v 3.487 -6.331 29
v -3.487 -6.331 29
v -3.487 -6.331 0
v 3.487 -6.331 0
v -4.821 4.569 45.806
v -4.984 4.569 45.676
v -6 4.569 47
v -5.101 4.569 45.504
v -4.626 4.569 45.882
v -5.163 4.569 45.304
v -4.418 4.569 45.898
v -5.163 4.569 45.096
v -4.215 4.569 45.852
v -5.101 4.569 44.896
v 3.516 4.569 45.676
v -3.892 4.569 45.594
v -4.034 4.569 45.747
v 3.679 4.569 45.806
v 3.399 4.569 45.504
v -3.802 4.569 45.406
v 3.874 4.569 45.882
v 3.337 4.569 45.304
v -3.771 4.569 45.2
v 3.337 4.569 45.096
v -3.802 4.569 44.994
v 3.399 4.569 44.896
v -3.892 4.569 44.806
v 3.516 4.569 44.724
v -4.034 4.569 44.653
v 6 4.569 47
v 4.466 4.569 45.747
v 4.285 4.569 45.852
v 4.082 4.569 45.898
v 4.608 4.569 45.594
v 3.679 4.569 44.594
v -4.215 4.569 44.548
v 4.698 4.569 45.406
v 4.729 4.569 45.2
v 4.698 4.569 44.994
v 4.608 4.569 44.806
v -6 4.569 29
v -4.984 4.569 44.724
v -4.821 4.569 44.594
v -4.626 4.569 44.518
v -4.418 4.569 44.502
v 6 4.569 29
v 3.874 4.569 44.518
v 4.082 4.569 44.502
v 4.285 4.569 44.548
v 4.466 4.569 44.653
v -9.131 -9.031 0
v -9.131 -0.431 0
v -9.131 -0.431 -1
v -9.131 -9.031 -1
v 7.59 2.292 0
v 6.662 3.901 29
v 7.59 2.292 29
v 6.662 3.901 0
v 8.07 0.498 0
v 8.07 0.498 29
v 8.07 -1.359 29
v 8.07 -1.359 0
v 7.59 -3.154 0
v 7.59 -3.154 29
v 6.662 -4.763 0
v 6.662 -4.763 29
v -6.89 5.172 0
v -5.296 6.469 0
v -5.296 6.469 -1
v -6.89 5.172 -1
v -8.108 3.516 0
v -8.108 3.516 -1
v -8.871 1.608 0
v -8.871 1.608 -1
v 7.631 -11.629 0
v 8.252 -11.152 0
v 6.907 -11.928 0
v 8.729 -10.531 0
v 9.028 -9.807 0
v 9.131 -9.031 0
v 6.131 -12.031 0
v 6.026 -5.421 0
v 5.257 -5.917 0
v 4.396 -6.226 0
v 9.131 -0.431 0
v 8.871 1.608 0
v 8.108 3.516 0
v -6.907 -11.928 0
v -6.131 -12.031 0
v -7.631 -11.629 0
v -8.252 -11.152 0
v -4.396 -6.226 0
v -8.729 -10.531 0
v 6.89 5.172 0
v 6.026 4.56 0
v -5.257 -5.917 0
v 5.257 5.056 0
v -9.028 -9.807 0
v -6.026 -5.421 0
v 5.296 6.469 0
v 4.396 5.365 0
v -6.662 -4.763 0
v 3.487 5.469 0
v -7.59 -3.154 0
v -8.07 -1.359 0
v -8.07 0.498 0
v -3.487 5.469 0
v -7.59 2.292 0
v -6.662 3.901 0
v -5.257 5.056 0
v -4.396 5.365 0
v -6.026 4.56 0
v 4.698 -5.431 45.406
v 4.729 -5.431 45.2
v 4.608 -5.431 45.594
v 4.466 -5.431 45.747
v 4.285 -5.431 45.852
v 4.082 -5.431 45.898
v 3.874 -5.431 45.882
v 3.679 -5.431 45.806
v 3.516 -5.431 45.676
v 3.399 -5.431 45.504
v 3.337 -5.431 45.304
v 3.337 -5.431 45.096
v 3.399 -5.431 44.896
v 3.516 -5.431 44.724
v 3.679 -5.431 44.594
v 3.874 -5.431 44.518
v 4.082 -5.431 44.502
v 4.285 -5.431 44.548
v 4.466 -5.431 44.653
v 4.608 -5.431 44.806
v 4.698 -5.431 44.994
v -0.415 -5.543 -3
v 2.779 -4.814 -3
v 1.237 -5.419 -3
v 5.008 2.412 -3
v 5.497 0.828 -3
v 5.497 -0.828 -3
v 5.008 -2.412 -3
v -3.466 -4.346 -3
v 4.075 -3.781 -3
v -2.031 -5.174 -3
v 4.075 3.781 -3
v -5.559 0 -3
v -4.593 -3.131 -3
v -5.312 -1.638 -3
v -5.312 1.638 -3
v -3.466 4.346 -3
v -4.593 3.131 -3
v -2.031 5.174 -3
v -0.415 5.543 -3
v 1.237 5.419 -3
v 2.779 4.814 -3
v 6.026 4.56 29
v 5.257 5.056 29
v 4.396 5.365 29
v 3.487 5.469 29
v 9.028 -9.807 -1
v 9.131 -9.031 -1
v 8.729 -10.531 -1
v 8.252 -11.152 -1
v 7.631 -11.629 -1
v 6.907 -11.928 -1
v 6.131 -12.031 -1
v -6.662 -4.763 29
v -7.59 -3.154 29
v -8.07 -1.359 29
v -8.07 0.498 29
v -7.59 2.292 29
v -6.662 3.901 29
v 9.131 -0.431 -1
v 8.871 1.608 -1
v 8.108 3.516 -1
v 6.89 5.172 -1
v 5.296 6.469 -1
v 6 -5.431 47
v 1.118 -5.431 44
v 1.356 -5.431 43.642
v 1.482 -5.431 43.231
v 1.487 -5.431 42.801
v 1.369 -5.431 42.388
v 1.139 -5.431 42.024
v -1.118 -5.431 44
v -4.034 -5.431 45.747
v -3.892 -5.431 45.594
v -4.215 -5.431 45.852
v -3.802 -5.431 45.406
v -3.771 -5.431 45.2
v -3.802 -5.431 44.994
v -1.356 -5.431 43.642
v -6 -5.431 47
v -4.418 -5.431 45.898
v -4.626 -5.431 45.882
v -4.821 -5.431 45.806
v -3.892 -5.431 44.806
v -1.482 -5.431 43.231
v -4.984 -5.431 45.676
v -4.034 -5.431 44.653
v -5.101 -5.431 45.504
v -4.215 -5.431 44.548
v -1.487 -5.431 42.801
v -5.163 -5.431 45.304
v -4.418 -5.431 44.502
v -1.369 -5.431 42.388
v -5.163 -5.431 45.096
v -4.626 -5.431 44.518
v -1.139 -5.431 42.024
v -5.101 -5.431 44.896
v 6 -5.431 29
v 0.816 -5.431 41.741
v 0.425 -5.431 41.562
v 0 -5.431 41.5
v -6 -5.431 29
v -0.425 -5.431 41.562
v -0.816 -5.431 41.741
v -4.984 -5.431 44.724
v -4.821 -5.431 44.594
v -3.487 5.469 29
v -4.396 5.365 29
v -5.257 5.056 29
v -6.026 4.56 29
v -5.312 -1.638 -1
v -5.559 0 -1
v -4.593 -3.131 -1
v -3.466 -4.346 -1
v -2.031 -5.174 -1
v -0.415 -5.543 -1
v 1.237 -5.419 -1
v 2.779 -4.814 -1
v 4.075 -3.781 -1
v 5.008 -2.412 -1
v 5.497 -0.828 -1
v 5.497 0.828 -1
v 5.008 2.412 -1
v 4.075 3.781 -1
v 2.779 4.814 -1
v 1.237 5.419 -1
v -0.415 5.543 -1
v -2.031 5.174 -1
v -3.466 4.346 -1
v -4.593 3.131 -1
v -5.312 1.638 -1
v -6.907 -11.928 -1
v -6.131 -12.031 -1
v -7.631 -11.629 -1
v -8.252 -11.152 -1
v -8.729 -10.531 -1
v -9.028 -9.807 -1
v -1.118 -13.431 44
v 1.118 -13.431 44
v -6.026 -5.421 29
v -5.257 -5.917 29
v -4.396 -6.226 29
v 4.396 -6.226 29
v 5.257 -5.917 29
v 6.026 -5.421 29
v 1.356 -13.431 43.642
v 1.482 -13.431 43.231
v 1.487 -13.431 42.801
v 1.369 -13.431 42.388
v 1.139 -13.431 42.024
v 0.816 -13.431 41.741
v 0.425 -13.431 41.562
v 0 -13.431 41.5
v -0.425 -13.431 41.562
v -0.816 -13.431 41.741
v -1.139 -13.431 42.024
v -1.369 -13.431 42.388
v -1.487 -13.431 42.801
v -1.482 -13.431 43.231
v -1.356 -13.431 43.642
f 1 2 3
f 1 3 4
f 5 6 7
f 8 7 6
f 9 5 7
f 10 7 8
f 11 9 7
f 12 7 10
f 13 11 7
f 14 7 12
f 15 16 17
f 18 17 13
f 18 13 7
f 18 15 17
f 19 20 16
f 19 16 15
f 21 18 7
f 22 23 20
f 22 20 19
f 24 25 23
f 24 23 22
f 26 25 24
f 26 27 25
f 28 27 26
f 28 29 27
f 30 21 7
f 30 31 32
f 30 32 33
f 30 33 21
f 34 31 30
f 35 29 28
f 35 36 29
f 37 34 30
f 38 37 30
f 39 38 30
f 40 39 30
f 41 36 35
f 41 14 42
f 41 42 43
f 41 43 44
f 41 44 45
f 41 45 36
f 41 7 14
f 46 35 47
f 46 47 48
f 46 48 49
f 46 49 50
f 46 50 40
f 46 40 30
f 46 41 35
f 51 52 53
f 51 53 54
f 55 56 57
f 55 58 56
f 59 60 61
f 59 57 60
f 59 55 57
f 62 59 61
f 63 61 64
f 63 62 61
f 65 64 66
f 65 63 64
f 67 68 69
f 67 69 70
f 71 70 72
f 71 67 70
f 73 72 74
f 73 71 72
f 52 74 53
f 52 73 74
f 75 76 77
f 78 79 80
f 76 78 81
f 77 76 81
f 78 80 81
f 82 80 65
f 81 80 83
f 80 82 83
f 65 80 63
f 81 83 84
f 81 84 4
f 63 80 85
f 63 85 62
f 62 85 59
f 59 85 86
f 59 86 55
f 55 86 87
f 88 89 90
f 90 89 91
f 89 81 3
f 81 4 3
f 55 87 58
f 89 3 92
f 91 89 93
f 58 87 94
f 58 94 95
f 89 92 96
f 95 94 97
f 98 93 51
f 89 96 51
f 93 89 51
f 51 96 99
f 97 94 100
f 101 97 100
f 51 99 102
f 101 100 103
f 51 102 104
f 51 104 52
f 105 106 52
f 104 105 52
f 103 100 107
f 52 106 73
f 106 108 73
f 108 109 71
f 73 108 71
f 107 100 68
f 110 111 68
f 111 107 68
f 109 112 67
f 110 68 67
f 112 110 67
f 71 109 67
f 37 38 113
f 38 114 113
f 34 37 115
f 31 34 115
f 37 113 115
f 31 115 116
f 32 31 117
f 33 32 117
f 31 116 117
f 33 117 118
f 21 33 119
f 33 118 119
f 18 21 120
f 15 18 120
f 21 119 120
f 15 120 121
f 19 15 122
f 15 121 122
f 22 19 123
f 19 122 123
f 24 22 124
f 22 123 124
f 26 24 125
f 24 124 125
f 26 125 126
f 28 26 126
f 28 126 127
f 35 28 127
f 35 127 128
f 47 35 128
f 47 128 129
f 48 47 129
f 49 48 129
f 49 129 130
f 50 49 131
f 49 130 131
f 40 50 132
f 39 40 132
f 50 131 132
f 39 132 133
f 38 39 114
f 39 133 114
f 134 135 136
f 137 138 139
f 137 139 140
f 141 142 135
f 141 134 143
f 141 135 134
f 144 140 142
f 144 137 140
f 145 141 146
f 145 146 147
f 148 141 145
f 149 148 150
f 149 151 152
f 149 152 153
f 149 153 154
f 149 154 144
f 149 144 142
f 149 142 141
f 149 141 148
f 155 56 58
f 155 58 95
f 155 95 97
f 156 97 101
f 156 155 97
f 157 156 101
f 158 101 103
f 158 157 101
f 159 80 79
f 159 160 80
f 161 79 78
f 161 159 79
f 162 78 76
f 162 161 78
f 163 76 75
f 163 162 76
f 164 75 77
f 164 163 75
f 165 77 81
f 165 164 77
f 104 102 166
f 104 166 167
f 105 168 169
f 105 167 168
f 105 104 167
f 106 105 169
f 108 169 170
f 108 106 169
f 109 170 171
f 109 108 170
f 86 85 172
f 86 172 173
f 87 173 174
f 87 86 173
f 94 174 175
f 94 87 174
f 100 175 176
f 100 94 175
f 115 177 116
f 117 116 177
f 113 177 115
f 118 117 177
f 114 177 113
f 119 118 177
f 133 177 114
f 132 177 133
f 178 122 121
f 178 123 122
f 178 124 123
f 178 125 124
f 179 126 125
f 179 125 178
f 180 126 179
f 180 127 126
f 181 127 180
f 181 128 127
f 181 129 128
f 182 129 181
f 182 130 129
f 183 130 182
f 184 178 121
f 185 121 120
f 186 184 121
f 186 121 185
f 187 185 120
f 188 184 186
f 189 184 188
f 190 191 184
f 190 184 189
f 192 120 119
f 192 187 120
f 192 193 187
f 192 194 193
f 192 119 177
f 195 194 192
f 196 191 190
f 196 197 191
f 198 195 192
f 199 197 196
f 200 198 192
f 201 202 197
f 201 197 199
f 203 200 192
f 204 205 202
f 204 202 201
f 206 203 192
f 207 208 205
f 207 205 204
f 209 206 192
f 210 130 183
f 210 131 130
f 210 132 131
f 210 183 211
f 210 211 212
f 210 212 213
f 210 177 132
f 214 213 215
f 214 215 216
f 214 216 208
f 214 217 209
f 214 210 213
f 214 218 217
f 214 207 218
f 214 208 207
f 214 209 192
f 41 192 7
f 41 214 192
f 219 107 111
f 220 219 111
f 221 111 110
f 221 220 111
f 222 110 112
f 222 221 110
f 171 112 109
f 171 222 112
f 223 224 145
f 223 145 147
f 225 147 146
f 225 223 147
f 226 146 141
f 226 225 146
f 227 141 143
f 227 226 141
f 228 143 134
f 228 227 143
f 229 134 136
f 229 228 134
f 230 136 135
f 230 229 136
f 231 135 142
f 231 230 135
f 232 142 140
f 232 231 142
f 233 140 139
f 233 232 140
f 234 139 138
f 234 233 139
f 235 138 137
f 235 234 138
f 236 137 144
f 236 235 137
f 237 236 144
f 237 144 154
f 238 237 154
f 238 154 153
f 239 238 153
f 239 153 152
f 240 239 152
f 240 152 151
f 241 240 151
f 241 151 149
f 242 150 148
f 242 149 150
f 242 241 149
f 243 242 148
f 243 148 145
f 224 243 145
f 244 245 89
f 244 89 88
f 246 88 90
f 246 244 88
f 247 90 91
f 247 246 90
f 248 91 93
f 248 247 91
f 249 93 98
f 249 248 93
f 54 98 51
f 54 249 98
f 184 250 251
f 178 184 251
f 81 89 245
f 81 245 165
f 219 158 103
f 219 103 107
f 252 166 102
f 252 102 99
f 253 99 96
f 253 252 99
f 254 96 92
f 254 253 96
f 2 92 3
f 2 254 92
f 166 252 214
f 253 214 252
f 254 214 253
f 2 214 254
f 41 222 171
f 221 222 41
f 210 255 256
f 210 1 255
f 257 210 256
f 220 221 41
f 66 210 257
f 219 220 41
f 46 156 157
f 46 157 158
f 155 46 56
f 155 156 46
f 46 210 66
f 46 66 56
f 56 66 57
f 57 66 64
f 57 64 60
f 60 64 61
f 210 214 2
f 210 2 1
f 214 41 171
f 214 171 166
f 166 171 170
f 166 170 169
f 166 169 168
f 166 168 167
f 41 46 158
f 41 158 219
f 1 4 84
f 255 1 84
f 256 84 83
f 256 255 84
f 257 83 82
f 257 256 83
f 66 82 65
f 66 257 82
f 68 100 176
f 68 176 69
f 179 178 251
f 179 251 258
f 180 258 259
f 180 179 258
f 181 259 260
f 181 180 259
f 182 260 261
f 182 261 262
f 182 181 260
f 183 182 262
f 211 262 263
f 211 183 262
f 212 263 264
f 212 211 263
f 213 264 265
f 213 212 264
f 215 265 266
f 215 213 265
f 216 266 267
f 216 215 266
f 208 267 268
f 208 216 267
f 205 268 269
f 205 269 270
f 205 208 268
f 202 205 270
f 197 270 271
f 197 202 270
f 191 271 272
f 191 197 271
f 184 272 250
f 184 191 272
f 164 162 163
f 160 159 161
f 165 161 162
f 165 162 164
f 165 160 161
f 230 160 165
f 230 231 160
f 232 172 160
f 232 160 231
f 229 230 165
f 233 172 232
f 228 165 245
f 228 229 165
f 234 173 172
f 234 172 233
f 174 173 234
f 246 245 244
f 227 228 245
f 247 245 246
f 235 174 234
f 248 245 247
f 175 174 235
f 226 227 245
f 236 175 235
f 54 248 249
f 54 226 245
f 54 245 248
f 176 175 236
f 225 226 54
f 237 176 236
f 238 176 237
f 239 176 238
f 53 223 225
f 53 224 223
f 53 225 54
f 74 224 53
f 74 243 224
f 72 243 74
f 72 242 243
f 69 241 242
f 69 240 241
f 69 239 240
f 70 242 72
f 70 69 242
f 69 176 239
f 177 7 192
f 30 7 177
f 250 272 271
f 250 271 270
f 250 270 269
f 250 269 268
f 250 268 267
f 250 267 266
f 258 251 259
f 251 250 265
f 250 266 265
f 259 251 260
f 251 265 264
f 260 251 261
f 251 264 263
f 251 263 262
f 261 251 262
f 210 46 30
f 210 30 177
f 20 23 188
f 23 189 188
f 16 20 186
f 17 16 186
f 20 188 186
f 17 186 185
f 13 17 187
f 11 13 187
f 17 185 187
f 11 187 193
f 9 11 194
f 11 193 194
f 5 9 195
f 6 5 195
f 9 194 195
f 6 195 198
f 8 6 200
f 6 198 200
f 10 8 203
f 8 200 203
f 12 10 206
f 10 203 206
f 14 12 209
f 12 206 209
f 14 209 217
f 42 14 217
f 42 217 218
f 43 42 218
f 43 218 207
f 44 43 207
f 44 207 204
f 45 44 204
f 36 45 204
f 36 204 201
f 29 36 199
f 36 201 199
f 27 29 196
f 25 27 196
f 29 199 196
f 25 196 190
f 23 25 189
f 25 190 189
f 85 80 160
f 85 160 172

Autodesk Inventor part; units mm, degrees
ref_plane "YZ Plane" through (0, 0, 0) normal (1, 0, 0) x (0, 1, 0)
ref_plane "XZ Plane" through (0, 0, 0) normal (0, 1, 0) x (-1, 0, 0)
ref_plane "XY Plane" through (0, 0, 0) normal (0, 0, 1) x (1, 0, 0)
sketch "草图1" plane through (0, 0, 0) normal (0, 0, 1) x (1, 0, 0)
  line L0 (-5, 0) -> (5, 0) construction
  line L1 (-5, -6.3307) -> (5, -6.3307)
  line L2 (5, 5.4693) -> (-5, 5.4693)
  arc A0 (-5, 5.4693) -> (-5, -6.3307) centre (-1.0059, -0.4307) ccw
  line L3 (0, 0) -> (0, 3.0217)
  arc A1 (5, -6.3307) -> (5, 5.4693) centre (1.0059, -0.4307) ccw
  line L4 (5, 5.4693) -> (5, -6.3307)
  line L5 (-5, 5.4693) -> (-5, -6.3307)
  point P0 (-10.9, 0)
  point P1 (10.9, 0)
  point P2 (10.9, 0)
  dimension "d0" = 11.8
  dimension "d6" = 10
extrude "拉伸1" add sketch "草图1" along normal blind 29
sketch "草图2" plane through (0, 0, 29) normal (0, 0, 1) x (1, 0, 0)
  line L0 (6, -5.4307) -> (-6, -5.4307)
  line L1 (-6, -5.4307) -> (-6, 4.5693)
  line L2 (-6, 4.5693) -> (6, 4.5693)
  line L3 (6, 4.5693) -> (6, -5.4307)
  line L4 (6, -5.4307) -> (-6, 4.5693) construction
  line L5 (-6, -5.4307) -> (6, 4.5693) construction
  line L6 (5, 5.4693) -> (-5, 5.4693) projected
  line L7 (0, 5.4693) -> (0, -6.3307)
  line L8 (-5, -6.3307) -> (5, -6.3307) projected
  point P0 (0, -0.4307)
  dimension "d4" = 10
  dimension "d5" = 12
extrude "拉伸2" add sketch "草图2" along normal blind 18
sketch "草图3" plane through (0, 0, 0) normal (0, 0, -1) x (-1, 0, 0)
  line L0 (5, -6.3307) -> (-5, -6.3307) projected
  arc A0 (5, -6.3307) -> (5, 5.4693) centre (1.0059, -0.4307) ccw projected
  line L1 (-5, 5.4693) -> (5, 5.4693) projected
  arc A1 (-5, 5.4693) -> (-5, -6.3307) centre (-1.0059, -0.4307) ccw projected
  arc A2 (5.2957, -7.3307) -> (5.2957, 6.4693) centre (1.0059, -0.4307) ccw
  line L2 (5.2957, -7.3307) -> (-5.2957, -7.3307)
  arc A3 (-5.2957, 6.4693) -> (-5.2957, -7.3307) centre (-1.0059, -0.4307) ccw
  line L3 (-5.2957, 6.4693) -> (5.2957, 6.4693)
  line L4 (-9.1307, -0.4307) -> (9.1307, -0.4307)
  line L5 (9.1307, -0.4307) -> (9.1307, -12.0307)
  line L6 (9.1307, -12.0307) -> (-9.1307, -12.0307)
  line L7 (-9.1307, -12.0307) -> (-9.1307, -0.4307)
  point P0 (0, 0)
  dimension "d9" = 1
  dimension "d10" = 18.5
extrude "拉伸3" add sketch "草图3" along normal blind 1
sketch "草图4" plane through (0, 0, -1) normal (0, 0, -1) x (-1, 0, 0)
  circle A0 centre (0, 0) radius 5.5587
extrude "拉伸4" add sketch "草图4" along normal blind 2
sketch "草图5" plane through (-6, -5.4307, 29) normal (0, 1, 0) x (1, 0, 0)
  circle A0 centre (6, -14) radius 1.5
  line L0 (12, -18) -> (0, -18) projected
  point P0 (6, 29)
  dimension "d15" = 4
  dimension "d16" = 3
extrude "拉伸5" add sketch "草图5" against normal blind 8
sketch "草图7" plane through (0, -13.4307, 43) normal (0, -1, 0) x (1, 0, 0)
  circle A0 centre (0, 0) radius 1.5 projected
  line L0 (-1.118, 1) -> (1.118, 1)
  point P0 (0, -43)
  point P1 (0, 1.5)
  dimension "d19" = 0.5
extrude "拉伸6" cut sketch "草图7" against normal up to surface (8 mm away) contours L0 A0 picked at (-0.0599, 1.1631)
fillet "圆角1" radius 4 4 edges at (-5, 5.4693, 14.5) (5, 5.4693, 14.5) (-5, -6.3307, 14.5) (5, -6.3307, 14.5)
fillet "圆角2" radius 3 2 edges at (-9.1307, -12.0307, -0.5) (9.1307, -12.0307, -0.5)
sketch "草图8" plane through (-6, -5.4307, 29) normal (0, -1, 0) x (1, 0, 0)
  circle A0 centre (10.0294, 16.2) radius 0.7
  circle A1 centre (1.5294, 16.2) radius 0.7
  line L0 (0, 18) -> (12, 18) projected
  point P0 (6, -29)
  dimension "d24" = 1.4
  dimension "d25" = 1.4
  dimension "d26" = 8.5
  dimension "d27" = 1.8
extrude "拉伸7" cut sketch "草图8" against normal blind 11.75
properties part number "电机"
